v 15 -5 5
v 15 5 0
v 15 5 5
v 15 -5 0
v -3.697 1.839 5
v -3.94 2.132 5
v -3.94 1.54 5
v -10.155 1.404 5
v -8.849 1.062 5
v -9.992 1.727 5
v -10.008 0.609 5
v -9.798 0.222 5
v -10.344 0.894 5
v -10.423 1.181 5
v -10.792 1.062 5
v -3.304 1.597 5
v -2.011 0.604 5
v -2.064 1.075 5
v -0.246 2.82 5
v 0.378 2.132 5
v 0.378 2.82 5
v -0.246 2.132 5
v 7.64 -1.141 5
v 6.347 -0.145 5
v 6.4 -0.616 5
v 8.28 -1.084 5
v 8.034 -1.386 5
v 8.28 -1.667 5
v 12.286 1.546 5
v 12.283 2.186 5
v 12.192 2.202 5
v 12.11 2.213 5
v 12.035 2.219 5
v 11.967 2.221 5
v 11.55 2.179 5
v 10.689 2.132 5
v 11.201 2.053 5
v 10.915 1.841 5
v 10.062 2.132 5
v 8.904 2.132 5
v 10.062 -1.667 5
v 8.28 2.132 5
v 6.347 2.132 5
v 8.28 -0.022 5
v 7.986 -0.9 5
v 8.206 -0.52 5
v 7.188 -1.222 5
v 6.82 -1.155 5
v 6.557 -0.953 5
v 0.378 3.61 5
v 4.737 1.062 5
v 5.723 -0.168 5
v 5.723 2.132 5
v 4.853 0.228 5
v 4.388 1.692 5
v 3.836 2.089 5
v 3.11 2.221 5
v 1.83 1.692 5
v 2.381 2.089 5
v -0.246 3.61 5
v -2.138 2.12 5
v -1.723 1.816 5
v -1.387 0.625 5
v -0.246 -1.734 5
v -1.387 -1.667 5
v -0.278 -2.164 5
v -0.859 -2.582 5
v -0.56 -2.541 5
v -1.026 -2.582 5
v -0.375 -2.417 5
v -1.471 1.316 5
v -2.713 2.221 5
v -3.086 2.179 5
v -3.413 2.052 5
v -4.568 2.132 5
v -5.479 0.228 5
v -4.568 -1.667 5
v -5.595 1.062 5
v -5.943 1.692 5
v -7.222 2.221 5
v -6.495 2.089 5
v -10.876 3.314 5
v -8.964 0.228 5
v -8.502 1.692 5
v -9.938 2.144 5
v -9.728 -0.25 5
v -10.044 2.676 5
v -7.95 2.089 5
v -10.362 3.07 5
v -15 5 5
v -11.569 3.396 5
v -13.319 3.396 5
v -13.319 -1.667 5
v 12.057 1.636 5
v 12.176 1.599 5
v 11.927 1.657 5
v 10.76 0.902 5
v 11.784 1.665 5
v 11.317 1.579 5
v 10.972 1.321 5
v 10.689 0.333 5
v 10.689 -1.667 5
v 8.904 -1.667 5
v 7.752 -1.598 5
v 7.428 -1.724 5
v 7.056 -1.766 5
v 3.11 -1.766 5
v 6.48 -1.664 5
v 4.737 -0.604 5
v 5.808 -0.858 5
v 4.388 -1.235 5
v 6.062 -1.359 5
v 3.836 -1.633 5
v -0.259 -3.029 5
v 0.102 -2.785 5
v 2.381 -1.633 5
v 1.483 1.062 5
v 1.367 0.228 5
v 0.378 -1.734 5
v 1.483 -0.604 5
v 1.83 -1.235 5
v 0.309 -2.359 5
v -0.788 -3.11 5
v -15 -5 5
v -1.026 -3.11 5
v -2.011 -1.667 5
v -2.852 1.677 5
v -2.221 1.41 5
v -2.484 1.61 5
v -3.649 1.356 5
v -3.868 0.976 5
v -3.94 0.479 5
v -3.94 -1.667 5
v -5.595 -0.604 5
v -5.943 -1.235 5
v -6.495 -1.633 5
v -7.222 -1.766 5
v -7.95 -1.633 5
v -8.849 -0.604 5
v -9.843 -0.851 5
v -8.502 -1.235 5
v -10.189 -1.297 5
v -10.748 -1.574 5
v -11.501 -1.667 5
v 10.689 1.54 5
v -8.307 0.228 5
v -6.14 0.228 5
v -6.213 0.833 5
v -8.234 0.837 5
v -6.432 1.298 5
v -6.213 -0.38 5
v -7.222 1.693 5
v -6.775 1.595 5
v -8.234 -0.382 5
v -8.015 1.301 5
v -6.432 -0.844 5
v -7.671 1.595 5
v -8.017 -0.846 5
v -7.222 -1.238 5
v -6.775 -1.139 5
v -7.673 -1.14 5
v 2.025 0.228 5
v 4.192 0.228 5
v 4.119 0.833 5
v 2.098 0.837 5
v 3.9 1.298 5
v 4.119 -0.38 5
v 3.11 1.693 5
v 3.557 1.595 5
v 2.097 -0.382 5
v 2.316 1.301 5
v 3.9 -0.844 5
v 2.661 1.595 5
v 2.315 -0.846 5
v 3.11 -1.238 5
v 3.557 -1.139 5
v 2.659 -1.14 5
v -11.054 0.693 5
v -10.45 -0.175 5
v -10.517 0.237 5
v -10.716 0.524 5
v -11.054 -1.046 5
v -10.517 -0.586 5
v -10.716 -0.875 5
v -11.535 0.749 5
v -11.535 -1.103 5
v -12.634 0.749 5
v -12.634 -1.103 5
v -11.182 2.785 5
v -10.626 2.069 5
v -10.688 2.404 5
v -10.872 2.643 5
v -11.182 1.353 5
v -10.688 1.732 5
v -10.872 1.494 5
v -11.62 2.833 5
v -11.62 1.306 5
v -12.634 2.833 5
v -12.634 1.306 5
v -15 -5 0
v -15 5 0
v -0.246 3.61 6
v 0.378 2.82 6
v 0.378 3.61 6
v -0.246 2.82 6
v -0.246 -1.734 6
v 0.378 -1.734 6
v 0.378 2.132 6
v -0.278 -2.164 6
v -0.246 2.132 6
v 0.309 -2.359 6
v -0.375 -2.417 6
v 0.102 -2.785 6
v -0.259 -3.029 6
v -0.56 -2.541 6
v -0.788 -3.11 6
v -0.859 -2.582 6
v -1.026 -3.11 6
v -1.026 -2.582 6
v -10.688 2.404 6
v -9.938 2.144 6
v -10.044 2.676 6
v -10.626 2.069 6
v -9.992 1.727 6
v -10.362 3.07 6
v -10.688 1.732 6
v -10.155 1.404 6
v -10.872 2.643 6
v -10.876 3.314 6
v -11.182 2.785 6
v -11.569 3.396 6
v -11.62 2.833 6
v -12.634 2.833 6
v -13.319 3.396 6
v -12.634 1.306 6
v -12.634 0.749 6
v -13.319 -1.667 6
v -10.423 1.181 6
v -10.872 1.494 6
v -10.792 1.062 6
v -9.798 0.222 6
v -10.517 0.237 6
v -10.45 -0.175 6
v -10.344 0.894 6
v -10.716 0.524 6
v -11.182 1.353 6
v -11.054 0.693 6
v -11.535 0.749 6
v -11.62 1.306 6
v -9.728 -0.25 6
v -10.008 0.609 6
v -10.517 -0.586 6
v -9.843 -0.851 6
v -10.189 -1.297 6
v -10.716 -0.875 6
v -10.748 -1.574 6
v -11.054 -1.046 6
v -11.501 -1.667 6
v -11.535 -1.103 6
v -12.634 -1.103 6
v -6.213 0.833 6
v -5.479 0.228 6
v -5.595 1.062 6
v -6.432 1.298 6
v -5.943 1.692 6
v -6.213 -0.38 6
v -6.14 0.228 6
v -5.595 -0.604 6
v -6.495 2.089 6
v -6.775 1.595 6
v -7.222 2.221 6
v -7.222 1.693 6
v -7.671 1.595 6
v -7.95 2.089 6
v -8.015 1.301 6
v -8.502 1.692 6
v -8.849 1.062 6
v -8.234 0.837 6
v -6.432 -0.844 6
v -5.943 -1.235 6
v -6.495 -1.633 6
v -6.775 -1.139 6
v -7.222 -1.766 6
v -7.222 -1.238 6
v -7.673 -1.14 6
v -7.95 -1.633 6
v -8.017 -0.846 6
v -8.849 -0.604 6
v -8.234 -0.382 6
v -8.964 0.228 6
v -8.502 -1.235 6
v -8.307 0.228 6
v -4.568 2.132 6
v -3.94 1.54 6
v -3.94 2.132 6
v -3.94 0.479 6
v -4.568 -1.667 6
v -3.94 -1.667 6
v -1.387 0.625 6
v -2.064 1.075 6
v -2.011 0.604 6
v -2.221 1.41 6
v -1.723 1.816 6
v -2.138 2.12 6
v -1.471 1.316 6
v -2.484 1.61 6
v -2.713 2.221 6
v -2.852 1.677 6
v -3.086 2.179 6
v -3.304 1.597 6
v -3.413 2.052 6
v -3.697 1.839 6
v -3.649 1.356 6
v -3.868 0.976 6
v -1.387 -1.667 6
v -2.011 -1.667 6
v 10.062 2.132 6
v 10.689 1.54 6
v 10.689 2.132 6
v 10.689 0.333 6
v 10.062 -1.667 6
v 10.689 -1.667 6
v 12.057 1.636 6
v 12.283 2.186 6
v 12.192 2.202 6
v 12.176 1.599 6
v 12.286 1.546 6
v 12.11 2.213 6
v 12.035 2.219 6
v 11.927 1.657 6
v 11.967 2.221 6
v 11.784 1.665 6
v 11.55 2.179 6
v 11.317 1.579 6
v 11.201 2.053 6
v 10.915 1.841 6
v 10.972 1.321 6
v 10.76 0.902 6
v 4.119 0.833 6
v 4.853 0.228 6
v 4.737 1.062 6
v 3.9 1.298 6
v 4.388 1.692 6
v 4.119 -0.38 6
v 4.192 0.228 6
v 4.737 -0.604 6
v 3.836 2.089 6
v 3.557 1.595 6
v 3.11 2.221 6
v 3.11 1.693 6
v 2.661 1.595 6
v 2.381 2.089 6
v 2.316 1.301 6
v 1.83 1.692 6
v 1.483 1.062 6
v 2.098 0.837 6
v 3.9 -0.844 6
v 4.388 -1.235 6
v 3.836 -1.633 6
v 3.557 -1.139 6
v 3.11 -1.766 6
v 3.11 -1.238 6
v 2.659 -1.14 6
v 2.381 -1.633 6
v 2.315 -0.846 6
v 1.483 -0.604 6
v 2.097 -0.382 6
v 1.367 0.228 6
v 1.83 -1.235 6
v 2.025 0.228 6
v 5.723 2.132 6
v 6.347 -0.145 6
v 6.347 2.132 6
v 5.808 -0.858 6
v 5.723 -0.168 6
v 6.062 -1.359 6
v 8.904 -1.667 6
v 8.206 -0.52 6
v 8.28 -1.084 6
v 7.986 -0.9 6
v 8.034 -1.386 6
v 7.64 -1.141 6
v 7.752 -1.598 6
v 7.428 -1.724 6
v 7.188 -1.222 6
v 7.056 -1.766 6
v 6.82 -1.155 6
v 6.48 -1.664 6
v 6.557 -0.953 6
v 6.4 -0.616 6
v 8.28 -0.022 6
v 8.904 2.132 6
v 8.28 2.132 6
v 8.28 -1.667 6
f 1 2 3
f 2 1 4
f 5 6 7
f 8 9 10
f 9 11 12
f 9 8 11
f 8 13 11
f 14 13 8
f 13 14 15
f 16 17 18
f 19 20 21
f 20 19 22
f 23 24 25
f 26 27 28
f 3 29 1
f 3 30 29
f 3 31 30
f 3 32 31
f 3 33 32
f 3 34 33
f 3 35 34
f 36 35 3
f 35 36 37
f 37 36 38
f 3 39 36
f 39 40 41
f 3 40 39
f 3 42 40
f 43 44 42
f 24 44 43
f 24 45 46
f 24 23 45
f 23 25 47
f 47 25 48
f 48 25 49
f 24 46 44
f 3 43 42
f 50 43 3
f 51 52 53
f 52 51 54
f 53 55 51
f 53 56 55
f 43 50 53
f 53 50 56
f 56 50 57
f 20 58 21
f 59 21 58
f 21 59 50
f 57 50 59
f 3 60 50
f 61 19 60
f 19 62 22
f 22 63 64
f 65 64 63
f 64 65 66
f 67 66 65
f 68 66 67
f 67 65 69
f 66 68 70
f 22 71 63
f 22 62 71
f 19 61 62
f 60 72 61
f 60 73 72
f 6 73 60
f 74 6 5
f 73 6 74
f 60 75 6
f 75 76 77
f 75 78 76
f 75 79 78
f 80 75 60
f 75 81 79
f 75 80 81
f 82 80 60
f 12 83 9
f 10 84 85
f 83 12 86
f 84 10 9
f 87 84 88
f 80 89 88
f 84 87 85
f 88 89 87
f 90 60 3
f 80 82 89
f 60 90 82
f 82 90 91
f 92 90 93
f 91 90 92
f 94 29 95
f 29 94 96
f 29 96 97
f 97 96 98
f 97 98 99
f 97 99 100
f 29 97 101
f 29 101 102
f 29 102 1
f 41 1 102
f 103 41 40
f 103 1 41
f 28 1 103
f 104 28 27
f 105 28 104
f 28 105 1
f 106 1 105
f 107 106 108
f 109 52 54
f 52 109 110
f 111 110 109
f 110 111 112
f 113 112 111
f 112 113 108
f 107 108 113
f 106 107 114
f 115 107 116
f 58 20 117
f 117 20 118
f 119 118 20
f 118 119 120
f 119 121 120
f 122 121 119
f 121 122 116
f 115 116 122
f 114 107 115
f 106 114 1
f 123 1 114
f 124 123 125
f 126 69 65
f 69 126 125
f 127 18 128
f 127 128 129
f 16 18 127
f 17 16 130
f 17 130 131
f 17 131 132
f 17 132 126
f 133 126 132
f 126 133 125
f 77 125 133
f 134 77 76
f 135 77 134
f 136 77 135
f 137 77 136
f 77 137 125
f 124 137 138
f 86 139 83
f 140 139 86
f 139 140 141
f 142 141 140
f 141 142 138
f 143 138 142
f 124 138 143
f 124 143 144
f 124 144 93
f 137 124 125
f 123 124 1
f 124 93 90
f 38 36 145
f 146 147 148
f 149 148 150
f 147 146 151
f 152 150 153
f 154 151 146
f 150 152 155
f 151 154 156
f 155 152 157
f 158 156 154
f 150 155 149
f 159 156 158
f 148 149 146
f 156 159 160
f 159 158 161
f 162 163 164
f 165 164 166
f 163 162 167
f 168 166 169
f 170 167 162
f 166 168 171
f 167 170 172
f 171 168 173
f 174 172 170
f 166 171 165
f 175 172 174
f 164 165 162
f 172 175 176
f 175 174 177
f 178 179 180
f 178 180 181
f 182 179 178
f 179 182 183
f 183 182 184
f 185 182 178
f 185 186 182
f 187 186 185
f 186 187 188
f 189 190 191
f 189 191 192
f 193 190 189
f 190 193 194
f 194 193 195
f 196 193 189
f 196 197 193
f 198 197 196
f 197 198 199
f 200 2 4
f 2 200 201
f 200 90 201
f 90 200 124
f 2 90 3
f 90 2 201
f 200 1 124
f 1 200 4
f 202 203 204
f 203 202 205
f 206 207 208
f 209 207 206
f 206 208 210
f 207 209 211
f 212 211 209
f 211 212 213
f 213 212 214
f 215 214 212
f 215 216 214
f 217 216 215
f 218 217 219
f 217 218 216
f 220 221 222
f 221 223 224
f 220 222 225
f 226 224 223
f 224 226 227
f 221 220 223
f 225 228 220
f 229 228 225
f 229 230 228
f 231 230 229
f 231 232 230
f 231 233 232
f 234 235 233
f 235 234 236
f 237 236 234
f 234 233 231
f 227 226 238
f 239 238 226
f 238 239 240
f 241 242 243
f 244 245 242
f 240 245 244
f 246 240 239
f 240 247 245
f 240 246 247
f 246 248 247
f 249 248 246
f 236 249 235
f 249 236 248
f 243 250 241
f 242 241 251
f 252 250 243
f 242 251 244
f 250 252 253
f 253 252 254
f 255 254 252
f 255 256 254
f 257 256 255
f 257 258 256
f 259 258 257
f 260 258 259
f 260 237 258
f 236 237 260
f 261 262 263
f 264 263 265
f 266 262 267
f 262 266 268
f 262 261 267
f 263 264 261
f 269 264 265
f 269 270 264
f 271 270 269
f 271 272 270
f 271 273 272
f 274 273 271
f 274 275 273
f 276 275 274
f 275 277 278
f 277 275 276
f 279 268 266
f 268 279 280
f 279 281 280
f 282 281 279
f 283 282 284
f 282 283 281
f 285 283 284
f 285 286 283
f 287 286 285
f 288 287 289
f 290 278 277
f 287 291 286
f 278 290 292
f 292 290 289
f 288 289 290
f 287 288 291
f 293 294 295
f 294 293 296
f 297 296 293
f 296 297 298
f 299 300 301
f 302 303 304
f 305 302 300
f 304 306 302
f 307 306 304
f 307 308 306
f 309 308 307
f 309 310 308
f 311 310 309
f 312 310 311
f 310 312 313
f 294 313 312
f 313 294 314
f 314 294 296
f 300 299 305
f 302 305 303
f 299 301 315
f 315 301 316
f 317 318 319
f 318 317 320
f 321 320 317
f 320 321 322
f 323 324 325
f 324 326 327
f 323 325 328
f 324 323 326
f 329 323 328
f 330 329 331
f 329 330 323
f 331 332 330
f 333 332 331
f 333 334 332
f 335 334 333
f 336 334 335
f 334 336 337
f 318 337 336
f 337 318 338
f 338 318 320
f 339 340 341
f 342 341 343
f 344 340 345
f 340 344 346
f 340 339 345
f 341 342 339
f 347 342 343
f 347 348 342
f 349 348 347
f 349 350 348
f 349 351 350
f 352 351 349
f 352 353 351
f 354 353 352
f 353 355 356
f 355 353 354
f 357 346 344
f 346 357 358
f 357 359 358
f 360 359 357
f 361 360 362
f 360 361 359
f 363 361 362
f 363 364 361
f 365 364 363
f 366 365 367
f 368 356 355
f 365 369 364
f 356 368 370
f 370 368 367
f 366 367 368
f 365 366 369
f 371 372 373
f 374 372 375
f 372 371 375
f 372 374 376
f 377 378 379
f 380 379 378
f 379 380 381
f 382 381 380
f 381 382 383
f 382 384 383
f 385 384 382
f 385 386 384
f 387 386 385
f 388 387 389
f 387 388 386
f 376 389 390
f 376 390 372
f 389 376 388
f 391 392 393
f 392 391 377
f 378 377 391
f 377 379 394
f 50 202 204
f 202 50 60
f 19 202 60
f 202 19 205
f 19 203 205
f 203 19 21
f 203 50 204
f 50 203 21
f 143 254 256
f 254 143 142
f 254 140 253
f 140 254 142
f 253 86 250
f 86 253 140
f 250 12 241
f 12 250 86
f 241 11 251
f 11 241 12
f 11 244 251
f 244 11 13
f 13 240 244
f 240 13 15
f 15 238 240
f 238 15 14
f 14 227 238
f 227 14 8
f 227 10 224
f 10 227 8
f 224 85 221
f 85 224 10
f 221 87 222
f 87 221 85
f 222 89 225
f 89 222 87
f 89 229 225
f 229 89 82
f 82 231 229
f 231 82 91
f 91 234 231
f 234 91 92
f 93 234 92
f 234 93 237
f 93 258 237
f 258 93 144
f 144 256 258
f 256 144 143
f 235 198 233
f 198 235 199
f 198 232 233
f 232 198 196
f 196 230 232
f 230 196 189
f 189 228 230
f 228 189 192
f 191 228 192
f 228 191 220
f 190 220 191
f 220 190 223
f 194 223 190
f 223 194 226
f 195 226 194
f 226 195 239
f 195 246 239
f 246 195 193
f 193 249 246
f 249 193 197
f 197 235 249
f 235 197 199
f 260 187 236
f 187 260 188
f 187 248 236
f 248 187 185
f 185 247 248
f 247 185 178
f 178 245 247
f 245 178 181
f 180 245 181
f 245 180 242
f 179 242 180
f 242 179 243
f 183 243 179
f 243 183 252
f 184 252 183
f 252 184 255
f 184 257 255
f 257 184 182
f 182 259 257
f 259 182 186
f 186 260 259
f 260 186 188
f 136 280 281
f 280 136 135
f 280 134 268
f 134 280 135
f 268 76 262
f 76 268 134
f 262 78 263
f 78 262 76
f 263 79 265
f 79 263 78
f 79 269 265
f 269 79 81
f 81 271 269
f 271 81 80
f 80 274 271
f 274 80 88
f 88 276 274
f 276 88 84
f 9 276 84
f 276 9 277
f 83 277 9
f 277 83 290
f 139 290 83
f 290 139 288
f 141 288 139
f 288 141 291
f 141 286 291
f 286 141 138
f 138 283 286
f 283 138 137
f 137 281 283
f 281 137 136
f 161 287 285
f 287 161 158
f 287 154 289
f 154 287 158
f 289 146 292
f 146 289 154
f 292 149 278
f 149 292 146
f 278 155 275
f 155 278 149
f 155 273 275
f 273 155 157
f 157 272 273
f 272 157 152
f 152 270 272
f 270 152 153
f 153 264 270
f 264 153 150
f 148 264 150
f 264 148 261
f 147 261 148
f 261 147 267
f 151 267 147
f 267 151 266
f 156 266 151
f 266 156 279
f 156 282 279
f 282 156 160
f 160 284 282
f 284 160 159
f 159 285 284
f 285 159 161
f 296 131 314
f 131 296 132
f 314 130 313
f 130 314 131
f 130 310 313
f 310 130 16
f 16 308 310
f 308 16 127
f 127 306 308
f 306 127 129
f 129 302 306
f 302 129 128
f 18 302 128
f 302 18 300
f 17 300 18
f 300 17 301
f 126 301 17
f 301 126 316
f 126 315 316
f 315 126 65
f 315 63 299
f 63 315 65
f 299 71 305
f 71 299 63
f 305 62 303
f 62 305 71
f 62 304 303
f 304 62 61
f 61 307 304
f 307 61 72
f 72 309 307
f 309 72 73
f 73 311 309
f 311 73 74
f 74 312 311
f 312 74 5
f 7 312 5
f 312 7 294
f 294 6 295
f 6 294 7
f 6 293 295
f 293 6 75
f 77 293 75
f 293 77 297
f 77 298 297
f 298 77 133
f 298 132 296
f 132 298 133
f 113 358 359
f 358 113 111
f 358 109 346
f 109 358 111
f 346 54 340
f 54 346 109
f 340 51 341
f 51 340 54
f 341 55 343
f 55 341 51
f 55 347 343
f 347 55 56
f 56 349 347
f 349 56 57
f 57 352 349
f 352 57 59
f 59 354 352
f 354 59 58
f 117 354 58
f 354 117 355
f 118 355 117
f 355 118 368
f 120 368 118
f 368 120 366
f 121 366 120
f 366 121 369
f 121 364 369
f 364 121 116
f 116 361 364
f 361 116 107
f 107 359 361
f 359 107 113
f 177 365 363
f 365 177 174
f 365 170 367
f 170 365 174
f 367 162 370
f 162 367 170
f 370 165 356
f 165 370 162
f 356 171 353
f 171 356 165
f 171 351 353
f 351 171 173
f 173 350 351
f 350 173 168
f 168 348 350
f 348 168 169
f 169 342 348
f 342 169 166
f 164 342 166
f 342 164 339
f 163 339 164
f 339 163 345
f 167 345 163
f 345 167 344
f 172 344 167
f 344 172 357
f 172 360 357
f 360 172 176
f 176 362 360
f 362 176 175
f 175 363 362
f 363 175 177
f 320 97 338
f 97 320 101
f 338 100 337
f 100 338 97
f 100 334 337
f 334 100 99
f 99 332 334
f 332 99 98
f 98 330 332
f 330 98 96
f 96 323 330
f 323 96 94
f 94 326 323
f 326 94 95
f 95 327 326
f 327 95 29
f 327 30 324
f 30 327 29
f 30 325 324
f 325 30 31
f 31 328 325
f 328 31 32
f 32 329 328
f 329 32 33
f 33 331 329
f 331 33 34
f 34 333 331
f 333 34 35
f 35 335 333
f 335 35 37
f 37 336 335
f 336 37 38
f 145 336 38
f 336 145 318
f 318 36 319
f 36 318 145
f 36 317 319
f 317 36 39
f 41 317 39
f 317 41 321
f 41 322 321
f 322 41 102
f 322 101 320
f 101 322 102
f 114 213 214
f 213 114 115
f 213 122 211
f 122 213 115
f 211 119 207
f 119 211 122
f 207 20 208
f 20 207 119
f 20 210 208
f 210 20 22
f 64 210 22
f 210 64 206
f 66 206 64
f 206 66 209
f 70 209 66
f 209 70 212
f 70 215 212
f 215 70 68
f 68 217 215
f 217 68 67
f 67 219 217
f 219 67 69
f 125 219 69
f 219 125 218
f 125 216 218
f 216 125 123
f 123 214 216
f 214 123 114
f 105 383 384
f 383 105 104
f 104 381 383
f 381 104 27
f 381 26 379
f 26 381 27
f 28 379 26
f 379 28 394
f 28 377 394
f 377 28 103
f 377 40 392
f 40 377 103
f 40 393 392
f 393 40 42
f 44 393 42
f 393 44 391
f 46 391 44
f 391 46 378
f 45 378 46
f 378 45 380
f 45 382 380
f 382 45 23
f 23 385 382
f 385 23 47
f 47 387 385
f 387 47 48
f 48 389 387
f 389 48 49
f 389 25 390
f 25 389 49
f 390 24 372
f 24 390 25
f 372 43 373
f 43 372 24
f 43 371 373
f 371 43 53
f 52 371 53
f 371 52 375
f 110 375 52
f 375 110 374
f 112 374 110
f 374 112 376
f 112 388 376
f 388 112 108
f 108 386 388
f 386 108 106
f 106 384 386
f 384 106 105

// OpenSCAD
$fn = 3; 
texte_a_inserer = "Bonjour"; 
taille = 5; 
police = "DejaVuSans"; //[[Abril Fatface,Aclonica,Acme,Advent Pro,Akronim,Aladin,Alegreya,Alegreya Sans,Alegreya SC,Alex Brush,Alfa Slab One,Alice,Amaranth,Architects Daughter,Archivo Black,Archivo Narrow,Arimo,Arvo,Asap,Astloch,Asul,Averia Libre,Averia Serif Libre,Bangers,Basic,Belgrano,Berkshire Swash,Bigshot One,Bilbo Swash Caps,Black Ops One,Bonbon,Bowlby One SC,Brawler,Bubblegum Sans,Butterfly Kids,Cabin Condensed,Caesar Dressing,Cagliostro,Calligraffitti,Capriola,Carter One,Changa One,Chango,Chelsea Market,Cherry Cream Soda,Chewy,Chicle,Chivo,Clicker Script,Coming Soon,Concert One,Condiment,Cookie,Courgette,Covered By Your Grace,Crimson Text,Dancing Script,DejaVu Sans,DejaVu Serif,Dhurjati,Doppio One,Dosis,Droid Sans,Eagle Lake,Electrolize,Emilys Candy,Encode Sans,Encode Sans Compressed,Euphoria Script,Exo,Exo 2,Faster One,Federo,Finger Paint,Fjord One,Fontdiner Swanky,Freckle Face,Fruktur,Gabriela,Geo,Germania One,Give You Glory,Gloria Hallelujah,Goudy Bookletter 1911,Graduate,Grand Hotel,Great Vibes,Griffy,Hanalei Fill,Happy Monkey,Henny Penny,Hind,IM Fell English SC,Indie Flower,Irish Grover,Italianno,Jacques Francois Shadow,Jolly Lodger,Josefin Slab,Joti One,Judson,Just Another Hand,Kalam,Kameron,Karma,Kavoon,Knewave,Kranky,Kristi,Laila,Lakki Reddy,Lancelot,Lato,Leckerli One,Ledger,Lekton,Lemon One,Liberation Sans,Libre Caslon Text,Life Savers,Lilita One,Lily Script One,Limelight,Lobster,Lobster Two,Londrina Outline,Londrina Shadow,Londrina Solid,Lora,Love Ya Like A Sister,Loved by the King,Lovers Quarrel,Luckiest Guy,Lusitana,Macondo,Macondo Swash Caps,Mako,Marck Script,Margarine,Marko One,Maven Pro,McLaren,MedievalSharp,Merienda One,Merriweather,Mervale Script,Metal Mania,Metrophobic,Milonga,Miltonian Tattoo,Miss Fajardose,Molle,Montez,Montserrat,Mr De Haviland,Mystery Quest,Neucha,New Rocker,Niconne,Nosifer,Nothing You Could Do,Noto Sans Oriya,Noto Serif,Nova Square,Nunito,Old Standard TT,Oleo Script,Oleo Script Swash Caps,Orbitron,Oregano,Orienta,Original Surfer,Oswald,Over the Rainbow,Overlock,Oxygen,Pacifico,Paprika,Parisienne,Patrick Hand SC,Paytone One,Peralta,Permanent Marker,Piedra,Pirata One,Play,Playball,Poetsen One,Poppins,Press Start 2P,Princess Sofia,PT Mono,Qwigley,Racing Sans One,Raleway,Rancho,Ranga,Ribeye,Roboto,Roboto Condensed,Roboto Slab,Rochester,Rock Salt,Rubik One,Sail,Salsa,Sansita One,Sarina,Satisfy,Schoolbell,Seaweed Script,Sevillana,Shadows Into Light,Shadows Into Light Two,Share,Six Caps,Skranji,Source Sans Pro,Spicy Rice,Stardos Stencil,Stoke,Syncopate,Teko,Terminal Dosis,The Girl Next Door,Tillana,Timmana,Titillium Web,Ubuntu,Ultra,Underdog,UnifrakturCook,UnifrakturMaguntia,Vampiro One,Vidaloka,Viga,Voces,Volkhov,Vollkorn,Voltaire,Waiting for the Sunrise,Wallpoet,Wellfleet,Wendy One,Yellowtail,Yesteryear,Zeyada]]
hauteur = 1; 
longueur_cube = 30; 
largeur_cube = 10; 
hauteur_cube = 5; 
relief_extrusion = "relief"; //[relief,extru]
module rendu(){
linear_extrude(hauteur) text(texte_a_inserer,size = taille, font = police);
}
module finao(){
if ( relief_extrusion == "relief") {
   union(){
 translate([0,0,0])   cube([longueur_cube,largeur_cube,hauteur_cube]);
translate([1,(largeur_cube/3),hauteur_cube]) rendu();
   } 
}
else
{
difference(){
 translate([0,0,0])   cube([longueur_cube,largeur_cube,hauteur_cube]);
translate([1,(largeur_cube/3),(hauteur_cube -hauteur+0.1)]) rendu();
}
 }
}
translate ([-(longueur_cube/2),-(largeur_cube/2),0]) finao();
